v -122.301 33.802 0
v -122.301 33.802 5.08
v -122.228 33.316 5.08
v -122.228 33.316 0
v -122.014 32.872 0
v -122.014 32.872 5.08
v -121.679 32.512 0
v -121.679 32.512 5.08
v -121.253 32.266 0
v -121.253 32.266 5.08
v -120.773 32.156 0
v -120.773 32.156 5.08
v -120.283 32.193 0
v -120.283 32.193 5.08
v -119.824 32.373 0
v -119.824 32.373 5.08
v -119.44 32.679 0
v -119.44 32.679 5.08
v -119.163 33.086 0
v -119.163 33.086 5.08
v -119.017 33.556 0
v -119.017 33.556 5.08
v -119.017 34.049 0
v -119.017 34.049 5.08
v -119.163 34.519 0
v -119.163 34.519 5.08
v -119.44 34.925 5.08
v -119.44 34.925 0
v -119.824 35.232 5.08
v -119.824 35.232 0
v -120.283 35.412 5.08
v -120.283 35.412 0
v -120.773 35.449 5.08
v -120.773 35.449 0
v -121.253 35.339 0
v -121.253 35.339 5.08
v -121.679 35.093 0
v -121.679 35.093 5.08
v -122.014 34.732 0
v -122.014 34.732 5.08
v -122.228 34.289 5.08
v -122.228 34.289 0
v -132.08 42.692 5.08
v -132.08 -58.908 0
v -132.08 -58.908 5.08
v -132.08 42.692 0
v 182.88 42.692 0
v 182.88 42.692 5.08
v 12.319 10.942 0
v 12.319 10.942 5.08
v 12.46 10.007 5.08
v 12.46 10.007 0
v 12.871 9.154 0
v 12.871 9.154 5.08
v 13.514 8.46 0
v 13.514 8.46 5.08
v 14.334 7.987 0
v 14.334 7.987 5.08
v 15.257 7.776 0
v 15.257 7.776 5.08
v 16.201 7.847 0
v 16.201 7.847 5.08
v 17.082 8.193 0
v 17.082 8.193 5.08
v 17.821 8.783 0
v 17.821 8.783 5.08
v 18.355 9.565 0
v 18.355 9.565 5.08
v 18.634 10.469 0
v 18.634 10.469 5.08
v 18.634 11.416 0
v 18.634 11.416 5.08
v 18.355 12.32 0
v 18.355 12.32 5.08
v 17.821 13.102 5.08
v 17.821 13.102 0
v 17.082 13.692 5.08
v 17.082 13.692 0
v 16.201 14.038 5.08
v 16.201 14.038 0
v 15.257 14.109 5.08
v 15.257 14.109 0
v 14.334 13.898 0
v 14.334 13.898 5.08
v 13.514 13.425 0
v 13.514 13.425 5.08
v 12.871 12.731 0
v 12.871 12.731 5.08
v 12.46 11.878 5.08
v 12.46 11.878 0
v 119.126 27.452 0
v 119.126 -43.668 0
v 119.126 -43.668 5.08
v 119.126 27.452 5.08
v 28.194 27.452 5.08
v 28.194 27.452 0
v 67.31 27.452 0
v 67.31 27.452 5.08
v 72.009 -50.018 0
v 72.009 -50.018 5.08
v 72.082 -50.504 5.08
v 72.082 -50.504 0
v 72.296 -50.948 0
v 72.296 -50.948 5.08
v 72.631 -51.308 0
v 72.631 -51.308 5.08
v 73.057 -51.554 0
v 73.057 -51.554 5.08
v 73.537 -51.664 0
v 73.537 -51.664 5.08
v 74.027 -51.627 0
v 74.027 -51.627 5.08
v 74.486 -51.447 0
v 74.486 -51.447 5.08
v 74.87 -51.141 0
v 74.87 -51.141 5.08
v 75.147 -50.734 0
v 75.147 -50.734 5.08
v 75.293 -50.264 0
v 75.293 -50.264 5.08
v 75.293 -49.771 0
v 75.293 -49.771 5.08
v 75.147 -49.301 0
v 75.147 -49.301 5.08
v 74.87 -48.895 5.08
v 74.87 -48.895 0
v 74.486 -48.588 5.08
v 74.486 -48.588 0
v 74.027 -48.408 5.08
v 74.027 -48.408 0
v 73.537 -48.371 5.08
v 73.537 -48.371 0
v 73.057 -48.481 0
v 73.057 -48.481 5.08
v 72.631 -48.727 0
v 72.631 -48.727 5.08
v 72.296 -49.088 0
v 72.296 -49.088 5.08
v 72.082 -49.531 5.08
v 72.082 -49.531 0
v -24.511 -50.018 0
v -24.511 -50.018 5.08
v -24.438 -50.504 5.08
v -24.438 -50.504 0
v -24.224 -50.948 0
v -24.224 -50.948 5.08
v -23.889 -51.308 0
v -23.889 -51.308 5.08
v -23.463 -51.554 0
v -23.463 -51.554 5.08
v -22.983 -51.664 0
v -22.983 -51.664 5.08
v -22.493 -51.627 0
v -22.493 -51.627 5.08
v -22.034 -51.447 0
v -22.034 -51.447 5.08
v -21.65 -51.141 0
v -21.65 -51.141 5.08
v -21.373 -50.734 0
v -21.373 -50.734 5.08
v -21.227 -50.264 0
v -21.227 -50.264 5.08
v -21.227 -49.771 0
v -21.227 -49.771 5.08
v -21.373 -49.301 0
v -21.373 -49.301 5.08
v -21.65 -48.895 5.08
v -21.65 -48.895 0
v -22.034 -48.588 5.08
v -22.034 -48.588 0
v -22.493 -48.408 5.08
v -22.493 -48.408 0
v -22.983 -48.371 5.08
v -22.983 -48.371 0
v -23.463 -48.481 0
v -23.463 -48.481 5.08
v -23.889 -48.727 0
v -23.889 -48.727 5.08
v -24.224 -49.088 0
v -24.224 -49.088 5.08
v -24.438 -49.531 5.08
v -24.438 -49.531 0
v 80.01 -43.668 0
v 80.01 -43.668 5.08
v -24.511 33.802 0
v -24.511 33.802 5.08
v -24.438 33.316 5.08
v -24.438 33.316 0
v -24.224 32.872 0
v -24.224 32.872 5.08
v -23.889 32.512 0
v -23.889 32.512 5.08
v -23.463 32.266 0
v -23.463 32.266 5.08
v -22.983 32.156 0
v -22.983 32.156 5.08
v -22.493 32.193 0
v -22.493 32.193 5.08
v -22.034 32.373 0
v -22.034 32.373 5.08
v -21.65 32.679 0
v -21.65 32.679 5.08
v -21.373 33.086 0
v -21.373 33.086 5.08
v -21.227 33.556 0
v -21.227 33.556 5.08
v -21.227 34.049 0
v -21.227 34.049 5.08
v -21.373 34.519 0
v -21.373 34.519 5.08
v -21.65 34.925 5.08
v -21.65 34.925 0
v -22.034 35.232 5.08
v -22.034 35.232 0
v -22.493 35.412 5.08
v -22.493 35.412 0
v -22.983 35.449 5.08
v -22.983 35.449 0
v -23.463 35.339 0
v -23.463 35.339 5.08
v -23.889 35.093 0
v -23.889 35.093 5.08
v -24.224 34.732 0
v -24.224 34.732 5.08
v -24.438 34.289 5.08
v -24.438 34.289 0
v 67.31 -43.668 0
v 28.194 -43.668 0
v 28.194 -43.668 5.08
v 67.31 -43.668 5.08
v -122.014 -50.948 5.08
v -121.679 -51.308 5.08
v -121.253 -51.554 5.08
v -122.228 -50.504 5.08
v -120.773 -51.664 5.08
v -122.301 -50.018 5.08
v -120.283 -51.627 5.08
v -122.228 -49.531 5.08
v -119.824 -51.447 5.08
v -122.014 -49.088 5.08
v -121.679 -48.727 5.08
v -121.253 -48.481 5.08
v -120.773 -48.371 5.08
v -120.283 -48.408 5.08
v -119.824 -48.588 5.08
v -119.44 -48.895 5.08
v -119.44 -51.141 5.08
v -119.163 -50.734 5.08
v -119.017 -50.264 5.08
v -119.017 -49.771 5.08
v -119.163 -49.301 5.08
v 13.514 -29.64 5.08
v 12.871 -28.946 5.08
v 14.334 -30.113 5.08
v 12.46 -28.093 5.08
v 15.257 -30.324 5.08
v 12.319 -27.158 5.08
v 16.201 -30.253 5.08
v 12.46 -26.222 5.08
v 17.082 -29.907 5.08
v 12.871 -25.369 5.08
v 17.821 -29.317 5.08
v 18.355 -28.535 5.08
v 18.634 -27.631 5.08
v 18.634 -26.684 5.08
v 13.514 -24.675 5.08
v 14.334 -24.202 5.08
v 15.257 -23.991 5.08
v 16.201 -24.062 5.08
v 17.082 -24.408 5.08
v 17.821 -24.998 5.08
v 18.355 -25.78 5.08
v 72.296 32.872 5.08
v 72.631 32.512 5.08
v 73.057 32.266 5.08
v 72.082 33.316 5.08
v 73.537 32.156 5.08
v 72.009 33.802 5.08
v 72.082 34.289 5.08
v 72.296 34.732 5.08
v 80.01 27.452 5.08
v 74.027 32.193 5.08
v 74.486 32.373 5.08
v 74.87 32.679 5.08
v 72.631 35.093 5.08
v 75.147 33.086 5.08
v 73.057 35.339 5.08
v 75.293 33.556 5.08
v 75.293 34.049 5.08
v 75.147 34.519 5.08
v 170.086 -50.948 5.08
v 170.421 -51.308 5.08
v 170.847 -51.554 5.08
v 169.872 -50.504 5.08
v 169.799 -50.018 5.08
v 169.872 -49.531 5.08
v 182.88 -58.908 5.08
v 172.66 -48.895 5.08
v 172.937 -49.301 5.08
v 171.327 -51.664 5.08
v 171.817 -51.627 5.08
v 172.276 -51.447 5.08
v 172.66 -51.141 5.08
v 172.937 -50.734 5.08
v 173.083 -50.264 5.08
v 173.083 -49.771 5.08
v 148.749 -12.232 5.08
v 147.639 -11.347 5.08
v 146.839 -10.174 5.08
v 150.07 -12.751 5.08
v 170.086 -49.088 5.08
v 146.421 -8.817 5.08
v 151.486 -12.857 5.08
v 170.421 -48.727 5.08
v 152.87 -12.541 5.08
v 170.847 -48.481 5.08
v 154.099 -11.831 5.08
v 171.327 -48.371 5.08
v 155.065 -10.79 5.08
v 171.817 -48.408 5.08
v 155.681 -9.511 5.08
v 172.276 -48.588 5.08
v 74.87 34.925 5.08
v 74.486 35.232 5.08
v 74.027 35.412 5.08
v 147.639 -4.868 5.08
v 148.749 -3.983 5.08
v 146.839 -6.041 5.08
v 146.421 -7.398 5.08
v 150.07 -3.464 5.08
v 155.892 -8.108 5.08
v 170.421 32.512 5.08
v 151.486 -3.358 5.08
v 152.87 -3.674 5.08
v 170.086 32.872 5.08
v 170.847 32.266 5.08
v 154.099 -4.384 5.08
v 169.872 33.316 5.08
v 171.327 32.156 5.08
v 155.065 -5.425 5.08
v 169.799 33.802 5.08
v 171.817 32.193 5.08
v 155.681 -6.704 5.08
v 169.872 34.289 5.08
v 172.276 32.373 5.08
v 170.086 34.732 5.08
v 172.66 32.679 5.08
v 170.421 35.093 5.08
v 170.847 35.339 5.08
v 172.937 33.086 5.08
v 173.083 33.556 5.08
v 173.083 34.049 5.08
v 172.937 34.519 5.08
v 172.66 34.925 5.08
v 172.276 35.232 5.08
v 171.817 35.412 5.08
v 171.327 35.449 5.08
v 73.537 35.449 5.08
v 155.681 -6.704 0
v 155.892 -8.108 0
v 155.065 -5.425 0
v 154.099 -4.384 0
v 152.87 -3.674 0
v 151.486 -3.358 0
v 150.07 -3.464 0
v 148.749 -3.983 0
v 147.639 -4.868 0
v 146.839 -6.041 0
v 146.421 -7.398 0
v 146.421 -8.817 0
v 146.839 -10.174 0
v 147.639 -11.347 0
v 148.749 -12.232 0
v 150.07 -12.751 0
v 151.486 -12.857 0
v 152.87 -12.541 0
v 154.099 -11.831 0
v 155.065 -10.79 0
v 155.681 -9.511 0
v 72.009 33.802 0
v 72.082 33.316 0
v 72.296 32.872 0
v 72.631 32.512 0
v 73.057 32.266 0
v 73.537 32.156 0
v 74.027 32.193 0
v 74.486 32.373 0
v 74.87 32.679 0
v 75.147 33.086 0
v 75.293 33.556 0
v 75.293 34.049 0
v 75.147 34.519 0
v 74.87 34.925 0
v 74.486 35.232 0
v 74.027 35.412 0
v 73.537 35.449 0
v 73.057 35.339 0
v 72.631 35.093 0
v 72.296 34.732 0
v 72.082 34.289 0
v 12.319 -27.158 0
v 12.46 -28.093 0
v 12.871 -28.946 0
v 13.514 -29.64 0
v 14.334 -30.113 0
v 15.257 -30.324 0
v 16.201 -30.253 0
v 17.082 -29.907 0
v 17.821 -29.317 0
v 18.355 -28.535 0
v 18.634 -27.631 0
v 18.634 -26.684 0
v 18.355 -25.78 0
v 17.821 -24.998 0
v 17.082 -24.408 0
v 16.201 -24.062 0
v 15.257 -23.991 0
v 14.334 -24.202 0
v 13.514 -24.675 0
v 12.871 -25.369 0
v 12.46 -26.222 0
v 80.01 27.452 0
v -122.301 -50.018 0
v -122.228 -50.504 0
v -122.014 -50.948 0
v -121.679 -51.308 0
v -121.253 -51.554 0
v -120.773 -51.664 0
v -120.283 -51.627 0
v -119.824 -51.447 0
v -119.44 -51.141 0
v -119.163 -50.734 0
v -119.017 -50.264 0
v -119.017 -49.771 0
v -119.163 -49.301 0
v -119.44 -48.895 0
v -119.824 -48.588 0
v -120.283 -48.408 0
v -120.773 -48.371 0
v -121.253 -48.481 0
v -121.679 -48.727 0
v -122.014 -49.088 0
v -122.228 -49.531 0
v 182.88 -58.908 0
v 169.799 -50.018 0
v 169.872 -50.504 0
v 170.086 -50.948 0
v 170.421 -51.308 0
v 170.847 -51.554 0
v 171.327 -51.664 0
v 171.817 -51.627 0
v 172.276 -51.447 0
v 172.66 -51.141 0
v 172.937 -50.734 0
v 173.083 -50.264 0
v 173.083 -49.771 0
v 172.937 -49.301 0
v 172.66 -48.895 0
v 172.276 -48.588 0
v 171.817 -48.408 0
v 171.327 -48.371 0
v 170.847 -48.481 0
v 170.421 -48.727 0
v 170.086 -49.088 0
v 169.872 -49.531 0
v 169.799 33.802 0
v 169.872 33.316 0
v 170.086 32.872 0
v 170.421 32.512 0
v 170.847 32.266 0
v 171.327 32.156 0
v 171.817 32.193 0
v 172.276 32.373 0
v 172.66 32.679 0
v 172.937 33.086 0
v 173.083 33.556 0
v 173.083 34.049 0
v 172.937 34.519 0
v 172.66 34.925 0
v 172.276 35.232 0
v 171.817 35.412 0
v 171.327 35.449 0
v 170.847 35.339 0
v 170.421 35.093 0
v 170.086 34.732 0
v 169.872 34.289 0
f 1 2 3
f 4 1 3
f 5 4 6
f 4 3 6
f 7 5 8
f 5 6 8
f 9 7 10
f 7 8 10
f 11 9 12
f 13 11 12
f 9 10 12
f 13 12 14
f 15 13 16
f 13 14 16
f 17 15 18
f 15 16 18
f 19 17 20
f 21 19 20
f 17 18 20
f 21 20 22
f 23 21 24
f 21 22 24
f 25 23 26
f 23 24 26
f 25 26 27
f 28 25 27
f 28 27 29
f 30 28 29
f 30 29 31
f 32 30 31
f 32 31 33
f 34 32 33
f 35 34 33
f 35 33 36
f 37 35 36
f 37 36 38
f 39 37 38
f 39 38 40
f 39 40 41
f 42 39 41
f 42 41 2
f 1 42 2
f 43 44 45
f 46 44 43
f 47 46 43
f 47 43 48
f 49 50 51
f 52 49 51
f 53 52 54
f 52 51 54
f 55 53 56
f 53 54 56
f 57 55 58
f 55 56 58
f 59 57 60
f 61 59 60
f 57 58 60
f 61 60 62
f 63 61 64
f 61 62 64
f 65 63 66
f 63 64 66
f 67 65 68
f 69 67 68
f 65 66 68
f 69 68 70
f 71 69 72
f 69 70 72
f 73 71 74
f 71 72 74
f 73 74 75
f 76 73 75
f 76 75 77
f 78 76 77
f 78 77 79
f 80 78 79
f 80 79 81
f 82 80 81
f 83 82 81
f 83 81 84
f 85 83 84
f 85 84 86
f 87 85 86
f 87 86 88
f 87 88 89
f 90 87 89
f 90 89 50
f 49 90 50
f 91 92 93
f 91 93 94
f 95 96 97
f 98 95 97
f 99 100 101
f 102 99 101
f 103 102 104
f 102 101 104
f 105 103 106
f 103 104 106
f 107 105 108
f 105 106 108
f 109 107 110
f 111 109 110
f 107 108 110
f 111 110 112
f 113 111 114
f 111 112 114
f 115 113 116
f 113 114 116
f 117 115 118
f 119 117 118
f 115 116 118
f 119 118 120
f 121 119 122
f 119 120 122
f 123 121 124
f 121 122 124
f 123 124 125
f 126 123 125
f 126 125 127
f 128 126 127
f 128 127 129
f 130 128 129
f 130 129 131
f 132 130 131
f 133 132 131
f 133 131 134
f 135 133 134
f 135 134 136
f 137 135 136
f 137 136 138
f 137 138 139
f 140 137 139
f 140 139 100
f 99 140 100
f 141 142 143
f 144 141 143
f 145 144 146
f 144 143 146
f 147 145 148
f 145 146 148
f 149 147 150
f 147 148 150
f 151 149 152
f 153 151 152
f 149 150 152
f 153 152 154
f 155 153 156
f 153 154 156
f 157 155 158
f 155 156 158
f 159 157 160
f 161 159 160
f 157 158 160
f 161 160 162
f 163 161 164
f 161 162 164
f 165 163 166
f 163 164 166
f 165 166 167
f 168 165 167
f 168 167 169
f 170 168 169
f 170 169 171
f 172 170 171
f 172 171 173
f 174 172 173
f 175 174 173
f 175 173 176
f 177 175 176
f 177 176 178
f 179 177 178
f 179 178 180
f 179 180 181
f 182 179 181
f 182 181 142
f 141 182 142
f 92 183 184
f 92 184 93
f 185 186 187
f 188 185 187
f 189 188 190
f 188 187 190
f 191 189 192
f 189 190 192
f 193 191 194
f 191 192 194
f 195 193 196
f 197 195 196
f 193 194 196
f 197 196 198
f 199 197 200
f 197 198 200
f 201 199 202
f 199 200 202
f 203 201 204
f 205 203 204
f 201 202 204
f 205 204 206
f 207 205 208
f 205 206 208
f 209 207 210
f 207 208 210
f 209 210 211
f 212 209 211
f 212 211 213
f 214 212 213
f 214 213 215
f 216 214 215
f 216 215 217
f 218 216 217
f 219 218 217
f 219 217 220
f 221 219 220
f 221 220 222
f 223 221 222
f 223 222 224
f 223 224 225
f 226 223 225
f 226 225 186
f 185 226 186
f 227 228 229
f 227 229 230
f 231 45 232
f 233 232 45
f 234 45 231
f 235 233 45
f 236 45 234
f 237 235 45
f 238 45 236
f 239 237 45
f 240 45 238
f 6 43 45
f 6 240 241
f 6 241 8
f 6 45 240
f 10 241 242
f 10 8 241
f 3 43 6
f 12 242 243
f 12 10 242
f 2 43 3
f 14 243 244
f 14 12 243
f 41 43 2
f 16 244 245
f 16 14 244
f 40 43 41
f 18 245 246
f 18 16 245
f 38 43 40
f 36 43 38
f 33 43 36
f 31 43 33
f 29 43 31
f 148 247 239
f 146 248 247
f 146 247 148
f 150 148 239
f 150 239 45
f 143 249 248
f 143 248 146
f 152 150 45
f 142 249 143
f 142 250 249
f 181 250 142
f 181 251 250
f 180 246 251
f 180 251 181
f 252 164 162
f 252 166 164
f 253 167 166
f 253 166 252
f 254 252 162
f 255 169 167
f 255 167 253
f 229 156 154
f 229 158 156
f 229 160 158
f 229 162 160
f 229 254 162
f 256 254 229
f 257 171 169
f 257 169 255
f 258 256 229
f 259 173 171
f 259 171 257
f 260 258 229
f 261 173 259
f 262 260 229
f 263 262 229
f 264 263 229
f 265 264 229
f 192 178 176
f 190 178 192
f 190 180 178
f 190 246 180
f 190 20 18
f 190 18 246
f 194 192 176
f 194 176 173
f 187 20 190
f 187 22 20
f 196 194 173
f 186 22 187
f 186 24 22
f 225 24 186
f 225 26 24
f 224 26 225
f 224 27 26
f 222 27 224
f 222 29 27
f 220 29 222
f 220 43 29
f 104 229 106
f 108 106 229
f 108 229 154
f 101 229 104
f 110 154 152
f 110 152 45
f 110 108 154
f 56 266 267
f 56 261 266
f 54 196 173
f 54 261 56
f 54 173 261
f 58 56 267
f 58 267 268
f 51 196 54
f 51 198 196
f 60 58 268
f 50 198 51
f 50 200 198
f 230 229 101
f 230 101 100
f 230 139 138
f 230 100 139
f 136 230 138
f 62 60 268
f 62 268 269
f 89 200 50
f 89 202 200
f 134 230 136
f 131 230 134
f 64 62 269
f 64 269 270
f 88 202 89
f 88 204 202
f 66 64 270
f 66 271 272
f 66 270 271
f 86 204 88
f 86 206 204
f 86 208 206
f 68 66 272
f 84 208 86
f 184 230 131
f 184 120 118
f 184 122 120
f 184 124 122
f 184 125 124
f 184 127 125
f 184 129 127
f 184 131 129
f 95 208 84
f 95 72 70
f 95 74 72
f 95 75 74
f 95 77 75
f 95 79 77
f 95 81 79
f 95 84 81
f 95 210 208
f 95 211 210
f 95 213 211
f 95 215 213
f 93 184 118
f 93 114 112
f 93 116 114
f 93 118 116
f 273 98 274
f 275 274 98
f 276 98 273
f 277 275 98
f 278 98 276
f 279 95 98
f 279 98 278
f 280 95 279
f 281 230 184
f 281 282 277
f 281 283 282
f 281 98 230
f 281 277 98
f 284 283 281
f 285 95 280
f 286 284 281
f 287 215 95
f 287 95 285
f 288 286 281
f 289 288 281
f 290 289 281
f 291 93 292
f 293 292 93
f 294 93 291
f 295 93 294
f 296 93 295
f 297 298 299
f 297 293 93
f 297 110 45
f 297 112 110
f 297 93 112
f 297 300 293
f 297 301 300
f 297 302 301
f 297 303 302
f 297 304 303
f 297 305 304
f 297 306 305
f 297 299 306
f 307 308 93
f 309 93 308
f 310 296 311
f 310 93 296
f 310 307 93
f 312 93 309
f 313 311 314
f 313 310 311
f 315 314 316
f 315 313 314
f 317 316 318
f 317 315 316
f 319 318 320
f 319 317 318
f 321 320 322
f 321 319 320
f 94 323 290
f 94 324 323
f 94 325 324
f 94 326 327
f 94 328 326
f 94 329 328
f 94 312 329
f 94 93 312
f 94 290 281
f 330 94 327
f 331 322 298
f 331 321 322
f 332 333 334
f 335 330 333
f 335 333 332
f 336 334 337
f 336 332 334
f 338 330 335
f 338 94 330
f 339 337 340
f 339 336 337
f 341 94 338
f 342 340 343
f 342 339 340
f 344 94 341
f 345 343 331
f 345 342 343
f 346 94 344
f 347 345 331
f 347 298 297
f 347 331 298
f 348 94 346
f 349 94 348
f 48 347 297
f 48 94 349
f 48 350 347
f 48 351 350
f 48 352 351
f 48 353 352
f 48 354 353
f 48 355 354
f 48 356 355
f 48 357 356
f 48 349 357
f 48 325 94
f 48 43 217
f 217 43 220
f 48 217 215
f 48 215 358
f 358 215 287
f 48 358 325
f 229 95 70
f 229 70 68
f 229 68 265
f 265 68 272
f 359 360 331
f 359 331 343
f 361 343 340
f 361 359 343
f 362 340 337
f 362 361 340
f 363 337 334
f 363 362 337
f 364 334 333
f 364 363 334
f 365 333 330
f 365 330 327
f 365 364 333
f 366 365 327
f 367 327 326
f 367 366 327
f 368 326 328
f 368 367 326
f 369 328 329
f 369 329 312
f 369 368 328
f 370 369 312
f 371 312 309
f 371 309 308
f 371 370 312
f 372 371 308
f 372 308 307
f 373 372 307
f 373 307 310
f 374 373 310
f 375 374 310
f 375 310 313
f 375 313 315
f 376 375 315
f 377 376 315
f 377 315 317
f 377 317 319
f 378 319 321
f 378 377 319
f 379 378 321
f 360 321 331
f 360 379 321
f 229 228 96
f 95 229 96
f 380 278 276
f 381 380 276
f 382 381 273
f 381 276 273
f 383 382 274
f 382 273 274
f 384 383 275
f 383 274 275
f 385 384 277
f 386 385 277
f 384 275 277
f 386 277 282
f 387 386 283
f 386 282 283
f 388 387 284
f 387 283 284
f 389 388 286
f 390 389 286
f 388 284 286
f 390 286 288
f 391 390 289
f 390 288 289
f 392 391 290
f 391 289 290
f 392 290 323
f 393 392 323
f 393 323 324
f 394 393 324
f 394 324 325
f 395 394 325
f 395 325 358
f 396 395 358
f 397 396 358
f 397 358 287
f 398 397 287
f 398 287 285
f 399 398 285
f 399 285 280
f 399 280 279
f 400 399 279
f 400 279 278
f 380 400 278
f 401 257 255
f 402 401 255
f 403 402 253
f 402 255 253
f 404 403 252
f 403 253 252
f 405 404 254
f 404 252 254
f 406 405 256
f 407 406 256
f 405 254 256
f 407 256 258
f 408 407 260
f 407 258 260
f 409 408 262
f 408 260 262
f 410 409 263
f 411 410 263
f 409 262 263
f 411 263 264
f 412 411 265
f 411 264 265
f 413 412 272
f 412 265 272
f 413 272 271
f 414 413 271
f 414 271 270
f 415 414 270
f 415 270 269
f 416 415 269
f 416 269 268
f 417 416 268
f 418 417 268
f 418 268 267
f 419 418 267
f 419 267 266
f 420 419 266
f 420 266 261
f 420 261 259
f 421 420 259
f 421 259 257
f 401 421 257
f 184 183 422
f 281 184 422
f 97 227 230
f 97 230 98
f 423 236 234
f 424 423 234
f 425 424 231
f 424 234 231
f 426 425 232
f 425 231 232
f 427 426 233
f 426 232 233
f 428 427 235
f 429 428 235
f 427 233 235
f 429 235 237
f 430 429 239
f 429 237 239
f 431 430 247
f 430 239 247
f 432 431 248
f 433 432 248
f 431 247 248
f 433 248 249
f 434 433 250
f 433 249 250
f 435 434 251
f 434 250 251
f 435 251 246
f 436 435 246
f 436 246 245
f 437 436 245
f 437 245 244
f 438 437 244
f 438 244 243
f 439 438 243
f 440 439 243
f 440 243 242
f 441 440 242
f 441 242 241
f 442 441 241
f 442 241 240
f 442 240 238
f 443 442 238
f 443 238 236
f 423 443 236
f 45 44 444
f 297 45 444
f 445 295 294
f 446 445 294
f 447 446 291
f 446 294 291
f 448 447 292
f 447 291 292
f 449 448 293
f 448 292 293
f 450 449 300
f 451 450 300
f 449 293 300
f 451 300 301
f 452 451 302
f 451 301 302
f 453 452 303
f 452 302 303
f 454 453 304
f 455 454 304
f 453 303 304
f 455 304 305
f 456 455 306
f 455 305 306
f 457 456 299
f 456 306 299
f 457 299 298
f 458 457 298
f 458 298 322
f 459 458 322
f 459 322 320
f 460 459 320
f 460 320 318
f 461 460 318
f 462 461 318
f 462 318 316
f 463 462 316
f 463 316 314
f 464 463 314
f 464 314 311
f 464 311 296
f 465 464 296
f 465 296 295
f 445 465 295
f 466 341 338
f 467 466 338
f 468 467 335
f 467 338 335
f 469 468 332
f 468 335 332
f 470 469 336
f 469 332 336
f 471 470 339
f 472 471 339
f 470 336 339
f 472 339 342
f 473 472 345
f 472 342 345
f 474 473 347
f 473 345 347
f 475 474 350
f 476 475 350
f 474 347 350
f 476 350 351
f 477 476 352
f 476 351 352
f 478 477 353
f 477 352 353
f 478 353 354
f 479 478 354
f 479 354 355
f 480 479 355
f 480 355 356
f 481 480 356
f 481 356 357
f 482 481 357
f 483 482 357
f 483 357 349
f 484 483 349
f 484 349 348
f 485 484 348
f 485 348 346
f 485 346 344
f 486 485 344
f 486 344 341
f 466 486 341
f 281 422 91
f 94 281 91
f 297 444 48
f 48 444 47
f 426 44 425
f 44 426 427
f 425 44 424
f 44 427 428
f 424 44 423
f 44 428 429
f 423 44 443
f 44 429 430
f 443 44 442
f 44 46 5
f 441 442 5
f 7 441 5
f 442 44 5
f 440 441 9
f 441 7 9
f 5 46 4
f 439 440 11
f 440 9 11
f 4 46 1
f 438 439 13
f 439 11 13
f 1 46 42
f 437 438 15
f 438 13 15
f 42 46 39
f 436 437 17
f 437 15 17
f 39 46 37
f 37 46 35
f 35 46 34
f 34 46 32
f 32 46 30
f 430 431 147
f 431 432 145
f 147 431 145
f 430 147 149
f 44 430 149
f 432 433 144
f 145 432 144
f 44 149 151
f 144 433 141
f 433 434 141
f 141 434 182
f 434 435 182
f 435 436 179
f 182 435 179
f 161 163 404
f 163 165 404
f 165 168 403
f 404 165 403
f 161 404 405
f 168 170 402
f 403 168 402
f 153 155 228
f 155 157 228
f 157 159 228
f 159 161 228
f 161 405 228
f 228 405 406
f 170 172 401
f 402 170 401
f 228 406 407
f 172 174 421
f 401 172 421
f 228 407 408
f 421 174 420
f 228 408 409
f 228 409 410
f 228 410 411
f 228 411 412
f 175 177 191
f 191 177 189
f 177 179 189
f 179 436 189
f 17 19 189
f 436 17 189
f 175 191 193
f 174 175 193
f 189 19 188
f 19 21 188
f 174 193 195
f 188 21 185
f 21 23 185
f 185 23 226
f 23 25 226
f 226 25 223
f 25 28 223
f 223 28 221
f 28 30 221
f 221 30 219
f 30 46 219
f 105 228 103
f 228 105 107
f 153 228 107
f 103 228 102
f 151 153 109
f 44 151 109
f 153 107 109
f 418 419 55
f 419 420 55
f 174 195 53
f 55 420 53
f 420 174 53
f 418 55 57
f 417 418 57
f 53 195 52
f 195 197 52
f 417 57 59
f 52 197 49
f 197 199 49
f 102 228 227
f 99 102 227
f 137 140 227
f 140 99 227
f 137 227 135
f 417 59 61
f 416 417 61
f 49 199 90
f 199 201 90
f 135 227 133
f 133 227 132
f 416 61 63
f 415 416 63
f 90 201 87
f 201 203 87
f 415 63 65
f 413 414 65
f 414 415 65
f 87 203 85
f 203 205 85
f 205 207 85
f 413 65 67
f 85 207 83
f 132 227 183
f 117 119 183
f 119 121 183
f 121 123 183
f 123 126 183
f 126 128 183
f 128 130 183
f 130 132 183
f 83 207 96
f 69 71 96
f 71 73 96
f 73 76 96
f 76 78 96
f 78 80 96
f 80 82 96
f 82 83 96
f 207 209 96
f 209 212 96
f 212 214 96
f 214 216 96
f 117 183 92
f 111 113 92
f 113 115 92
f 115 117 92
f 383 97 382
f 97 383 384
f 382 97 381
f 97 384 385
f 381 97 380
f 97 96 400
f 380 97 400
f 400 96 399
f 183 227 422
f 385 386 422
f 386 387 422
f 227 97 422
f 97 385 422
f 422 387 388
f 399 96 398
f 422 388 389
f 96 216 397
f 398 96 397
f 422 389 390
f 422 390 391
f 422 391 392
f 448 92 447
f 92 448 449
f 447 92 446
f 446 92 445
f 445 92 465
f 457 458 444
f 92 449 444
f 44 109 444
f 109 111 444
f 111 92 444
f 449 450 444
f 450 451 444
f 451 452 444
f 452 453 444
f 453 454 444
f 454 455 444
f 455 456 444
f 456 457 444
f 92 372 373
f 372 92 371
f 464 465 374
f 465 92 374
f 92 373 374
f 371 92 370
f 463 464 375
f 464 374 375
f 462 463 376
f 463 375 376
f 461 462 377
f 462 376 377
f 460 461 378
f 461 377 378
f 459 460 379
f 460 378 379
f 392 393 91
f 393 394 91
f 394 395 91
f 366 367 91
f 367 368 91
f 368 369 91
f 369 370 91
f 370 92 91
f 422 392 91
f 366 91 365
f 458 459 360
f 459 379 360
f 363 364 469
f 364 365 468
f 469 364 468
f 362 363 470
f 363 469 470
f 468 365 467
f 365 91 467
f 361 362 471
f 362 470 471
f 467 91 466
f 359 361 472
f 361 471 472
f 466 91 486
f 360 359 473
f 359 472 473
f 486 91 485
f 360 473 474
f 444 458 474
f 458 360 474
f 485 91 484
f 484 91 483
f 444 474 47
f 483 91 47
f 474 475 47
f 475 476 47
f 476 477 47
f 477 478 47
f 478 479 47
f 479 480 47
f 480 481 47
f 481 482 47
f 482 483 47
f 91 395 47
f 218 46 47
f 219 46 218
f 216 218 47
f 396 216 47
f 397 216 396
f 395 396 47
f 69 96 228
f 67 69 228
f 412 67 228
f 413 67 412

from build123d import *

# Parameters (mm, degrees)
F0_W     = 314.96
F0_H     = 101.6
F0_W_2   = 39.116
F0_H_2   = 71.12
F0_R     = 4.7625
F1_DEPTH = 5.08
F2_D     = 3.302
F3_D     = 6.35


with BuildPart() as f1:
    # F0 (on Top) → F1 (new body)
    with BuildSketch(Plane.XY):
        with Locations((25.4, -8.1075665182)):
            Rectangle(F0_W, F0_H)
        with Locations((47.752, -8.1075665182)):
            Rectangle(F0_W_2, F0_H_2, mode=Mode.SUBTRACT)
        with Locations((99.568, -8.1075665182)):
            Rectangle(F0_W_2, F0_H_2, mode=Mode.SUBTRACT)
        with Locations((151.13, -8.1075665182)):
            Circle(F0_R, mode=Mode.SUBTRACT)
    extrude(amount=F1_DEPTH)

    # F2 (through all)
    with Locations(Plane(origin=(0, 0, 0), x_dir=(1, 0, 0), z_dir=(0, 0, -1))):
        with Locations((-120.65, -33.8024334818), (-22.86, -33.8024334818), (73.66, -33.8024334818), (171.45, -33.8024334818), (171.45, 50.0175665182), (73.66, 50.0175665182), (-22.86, 50.0175665182), (-120.65, 50.0175665182)):
            Hole(F2_D / 2)

    # F3 (through all)
    with Locations(Plane(origin=(0, 0, 0), x_dir=(1, 0, 0), z_dir=(0, 0, -1))):
        with Locations((15.494, -10.9424334818), (15.494, 27.1575665182)):
            Hole(F3_D / 2)


solid = f1.part
